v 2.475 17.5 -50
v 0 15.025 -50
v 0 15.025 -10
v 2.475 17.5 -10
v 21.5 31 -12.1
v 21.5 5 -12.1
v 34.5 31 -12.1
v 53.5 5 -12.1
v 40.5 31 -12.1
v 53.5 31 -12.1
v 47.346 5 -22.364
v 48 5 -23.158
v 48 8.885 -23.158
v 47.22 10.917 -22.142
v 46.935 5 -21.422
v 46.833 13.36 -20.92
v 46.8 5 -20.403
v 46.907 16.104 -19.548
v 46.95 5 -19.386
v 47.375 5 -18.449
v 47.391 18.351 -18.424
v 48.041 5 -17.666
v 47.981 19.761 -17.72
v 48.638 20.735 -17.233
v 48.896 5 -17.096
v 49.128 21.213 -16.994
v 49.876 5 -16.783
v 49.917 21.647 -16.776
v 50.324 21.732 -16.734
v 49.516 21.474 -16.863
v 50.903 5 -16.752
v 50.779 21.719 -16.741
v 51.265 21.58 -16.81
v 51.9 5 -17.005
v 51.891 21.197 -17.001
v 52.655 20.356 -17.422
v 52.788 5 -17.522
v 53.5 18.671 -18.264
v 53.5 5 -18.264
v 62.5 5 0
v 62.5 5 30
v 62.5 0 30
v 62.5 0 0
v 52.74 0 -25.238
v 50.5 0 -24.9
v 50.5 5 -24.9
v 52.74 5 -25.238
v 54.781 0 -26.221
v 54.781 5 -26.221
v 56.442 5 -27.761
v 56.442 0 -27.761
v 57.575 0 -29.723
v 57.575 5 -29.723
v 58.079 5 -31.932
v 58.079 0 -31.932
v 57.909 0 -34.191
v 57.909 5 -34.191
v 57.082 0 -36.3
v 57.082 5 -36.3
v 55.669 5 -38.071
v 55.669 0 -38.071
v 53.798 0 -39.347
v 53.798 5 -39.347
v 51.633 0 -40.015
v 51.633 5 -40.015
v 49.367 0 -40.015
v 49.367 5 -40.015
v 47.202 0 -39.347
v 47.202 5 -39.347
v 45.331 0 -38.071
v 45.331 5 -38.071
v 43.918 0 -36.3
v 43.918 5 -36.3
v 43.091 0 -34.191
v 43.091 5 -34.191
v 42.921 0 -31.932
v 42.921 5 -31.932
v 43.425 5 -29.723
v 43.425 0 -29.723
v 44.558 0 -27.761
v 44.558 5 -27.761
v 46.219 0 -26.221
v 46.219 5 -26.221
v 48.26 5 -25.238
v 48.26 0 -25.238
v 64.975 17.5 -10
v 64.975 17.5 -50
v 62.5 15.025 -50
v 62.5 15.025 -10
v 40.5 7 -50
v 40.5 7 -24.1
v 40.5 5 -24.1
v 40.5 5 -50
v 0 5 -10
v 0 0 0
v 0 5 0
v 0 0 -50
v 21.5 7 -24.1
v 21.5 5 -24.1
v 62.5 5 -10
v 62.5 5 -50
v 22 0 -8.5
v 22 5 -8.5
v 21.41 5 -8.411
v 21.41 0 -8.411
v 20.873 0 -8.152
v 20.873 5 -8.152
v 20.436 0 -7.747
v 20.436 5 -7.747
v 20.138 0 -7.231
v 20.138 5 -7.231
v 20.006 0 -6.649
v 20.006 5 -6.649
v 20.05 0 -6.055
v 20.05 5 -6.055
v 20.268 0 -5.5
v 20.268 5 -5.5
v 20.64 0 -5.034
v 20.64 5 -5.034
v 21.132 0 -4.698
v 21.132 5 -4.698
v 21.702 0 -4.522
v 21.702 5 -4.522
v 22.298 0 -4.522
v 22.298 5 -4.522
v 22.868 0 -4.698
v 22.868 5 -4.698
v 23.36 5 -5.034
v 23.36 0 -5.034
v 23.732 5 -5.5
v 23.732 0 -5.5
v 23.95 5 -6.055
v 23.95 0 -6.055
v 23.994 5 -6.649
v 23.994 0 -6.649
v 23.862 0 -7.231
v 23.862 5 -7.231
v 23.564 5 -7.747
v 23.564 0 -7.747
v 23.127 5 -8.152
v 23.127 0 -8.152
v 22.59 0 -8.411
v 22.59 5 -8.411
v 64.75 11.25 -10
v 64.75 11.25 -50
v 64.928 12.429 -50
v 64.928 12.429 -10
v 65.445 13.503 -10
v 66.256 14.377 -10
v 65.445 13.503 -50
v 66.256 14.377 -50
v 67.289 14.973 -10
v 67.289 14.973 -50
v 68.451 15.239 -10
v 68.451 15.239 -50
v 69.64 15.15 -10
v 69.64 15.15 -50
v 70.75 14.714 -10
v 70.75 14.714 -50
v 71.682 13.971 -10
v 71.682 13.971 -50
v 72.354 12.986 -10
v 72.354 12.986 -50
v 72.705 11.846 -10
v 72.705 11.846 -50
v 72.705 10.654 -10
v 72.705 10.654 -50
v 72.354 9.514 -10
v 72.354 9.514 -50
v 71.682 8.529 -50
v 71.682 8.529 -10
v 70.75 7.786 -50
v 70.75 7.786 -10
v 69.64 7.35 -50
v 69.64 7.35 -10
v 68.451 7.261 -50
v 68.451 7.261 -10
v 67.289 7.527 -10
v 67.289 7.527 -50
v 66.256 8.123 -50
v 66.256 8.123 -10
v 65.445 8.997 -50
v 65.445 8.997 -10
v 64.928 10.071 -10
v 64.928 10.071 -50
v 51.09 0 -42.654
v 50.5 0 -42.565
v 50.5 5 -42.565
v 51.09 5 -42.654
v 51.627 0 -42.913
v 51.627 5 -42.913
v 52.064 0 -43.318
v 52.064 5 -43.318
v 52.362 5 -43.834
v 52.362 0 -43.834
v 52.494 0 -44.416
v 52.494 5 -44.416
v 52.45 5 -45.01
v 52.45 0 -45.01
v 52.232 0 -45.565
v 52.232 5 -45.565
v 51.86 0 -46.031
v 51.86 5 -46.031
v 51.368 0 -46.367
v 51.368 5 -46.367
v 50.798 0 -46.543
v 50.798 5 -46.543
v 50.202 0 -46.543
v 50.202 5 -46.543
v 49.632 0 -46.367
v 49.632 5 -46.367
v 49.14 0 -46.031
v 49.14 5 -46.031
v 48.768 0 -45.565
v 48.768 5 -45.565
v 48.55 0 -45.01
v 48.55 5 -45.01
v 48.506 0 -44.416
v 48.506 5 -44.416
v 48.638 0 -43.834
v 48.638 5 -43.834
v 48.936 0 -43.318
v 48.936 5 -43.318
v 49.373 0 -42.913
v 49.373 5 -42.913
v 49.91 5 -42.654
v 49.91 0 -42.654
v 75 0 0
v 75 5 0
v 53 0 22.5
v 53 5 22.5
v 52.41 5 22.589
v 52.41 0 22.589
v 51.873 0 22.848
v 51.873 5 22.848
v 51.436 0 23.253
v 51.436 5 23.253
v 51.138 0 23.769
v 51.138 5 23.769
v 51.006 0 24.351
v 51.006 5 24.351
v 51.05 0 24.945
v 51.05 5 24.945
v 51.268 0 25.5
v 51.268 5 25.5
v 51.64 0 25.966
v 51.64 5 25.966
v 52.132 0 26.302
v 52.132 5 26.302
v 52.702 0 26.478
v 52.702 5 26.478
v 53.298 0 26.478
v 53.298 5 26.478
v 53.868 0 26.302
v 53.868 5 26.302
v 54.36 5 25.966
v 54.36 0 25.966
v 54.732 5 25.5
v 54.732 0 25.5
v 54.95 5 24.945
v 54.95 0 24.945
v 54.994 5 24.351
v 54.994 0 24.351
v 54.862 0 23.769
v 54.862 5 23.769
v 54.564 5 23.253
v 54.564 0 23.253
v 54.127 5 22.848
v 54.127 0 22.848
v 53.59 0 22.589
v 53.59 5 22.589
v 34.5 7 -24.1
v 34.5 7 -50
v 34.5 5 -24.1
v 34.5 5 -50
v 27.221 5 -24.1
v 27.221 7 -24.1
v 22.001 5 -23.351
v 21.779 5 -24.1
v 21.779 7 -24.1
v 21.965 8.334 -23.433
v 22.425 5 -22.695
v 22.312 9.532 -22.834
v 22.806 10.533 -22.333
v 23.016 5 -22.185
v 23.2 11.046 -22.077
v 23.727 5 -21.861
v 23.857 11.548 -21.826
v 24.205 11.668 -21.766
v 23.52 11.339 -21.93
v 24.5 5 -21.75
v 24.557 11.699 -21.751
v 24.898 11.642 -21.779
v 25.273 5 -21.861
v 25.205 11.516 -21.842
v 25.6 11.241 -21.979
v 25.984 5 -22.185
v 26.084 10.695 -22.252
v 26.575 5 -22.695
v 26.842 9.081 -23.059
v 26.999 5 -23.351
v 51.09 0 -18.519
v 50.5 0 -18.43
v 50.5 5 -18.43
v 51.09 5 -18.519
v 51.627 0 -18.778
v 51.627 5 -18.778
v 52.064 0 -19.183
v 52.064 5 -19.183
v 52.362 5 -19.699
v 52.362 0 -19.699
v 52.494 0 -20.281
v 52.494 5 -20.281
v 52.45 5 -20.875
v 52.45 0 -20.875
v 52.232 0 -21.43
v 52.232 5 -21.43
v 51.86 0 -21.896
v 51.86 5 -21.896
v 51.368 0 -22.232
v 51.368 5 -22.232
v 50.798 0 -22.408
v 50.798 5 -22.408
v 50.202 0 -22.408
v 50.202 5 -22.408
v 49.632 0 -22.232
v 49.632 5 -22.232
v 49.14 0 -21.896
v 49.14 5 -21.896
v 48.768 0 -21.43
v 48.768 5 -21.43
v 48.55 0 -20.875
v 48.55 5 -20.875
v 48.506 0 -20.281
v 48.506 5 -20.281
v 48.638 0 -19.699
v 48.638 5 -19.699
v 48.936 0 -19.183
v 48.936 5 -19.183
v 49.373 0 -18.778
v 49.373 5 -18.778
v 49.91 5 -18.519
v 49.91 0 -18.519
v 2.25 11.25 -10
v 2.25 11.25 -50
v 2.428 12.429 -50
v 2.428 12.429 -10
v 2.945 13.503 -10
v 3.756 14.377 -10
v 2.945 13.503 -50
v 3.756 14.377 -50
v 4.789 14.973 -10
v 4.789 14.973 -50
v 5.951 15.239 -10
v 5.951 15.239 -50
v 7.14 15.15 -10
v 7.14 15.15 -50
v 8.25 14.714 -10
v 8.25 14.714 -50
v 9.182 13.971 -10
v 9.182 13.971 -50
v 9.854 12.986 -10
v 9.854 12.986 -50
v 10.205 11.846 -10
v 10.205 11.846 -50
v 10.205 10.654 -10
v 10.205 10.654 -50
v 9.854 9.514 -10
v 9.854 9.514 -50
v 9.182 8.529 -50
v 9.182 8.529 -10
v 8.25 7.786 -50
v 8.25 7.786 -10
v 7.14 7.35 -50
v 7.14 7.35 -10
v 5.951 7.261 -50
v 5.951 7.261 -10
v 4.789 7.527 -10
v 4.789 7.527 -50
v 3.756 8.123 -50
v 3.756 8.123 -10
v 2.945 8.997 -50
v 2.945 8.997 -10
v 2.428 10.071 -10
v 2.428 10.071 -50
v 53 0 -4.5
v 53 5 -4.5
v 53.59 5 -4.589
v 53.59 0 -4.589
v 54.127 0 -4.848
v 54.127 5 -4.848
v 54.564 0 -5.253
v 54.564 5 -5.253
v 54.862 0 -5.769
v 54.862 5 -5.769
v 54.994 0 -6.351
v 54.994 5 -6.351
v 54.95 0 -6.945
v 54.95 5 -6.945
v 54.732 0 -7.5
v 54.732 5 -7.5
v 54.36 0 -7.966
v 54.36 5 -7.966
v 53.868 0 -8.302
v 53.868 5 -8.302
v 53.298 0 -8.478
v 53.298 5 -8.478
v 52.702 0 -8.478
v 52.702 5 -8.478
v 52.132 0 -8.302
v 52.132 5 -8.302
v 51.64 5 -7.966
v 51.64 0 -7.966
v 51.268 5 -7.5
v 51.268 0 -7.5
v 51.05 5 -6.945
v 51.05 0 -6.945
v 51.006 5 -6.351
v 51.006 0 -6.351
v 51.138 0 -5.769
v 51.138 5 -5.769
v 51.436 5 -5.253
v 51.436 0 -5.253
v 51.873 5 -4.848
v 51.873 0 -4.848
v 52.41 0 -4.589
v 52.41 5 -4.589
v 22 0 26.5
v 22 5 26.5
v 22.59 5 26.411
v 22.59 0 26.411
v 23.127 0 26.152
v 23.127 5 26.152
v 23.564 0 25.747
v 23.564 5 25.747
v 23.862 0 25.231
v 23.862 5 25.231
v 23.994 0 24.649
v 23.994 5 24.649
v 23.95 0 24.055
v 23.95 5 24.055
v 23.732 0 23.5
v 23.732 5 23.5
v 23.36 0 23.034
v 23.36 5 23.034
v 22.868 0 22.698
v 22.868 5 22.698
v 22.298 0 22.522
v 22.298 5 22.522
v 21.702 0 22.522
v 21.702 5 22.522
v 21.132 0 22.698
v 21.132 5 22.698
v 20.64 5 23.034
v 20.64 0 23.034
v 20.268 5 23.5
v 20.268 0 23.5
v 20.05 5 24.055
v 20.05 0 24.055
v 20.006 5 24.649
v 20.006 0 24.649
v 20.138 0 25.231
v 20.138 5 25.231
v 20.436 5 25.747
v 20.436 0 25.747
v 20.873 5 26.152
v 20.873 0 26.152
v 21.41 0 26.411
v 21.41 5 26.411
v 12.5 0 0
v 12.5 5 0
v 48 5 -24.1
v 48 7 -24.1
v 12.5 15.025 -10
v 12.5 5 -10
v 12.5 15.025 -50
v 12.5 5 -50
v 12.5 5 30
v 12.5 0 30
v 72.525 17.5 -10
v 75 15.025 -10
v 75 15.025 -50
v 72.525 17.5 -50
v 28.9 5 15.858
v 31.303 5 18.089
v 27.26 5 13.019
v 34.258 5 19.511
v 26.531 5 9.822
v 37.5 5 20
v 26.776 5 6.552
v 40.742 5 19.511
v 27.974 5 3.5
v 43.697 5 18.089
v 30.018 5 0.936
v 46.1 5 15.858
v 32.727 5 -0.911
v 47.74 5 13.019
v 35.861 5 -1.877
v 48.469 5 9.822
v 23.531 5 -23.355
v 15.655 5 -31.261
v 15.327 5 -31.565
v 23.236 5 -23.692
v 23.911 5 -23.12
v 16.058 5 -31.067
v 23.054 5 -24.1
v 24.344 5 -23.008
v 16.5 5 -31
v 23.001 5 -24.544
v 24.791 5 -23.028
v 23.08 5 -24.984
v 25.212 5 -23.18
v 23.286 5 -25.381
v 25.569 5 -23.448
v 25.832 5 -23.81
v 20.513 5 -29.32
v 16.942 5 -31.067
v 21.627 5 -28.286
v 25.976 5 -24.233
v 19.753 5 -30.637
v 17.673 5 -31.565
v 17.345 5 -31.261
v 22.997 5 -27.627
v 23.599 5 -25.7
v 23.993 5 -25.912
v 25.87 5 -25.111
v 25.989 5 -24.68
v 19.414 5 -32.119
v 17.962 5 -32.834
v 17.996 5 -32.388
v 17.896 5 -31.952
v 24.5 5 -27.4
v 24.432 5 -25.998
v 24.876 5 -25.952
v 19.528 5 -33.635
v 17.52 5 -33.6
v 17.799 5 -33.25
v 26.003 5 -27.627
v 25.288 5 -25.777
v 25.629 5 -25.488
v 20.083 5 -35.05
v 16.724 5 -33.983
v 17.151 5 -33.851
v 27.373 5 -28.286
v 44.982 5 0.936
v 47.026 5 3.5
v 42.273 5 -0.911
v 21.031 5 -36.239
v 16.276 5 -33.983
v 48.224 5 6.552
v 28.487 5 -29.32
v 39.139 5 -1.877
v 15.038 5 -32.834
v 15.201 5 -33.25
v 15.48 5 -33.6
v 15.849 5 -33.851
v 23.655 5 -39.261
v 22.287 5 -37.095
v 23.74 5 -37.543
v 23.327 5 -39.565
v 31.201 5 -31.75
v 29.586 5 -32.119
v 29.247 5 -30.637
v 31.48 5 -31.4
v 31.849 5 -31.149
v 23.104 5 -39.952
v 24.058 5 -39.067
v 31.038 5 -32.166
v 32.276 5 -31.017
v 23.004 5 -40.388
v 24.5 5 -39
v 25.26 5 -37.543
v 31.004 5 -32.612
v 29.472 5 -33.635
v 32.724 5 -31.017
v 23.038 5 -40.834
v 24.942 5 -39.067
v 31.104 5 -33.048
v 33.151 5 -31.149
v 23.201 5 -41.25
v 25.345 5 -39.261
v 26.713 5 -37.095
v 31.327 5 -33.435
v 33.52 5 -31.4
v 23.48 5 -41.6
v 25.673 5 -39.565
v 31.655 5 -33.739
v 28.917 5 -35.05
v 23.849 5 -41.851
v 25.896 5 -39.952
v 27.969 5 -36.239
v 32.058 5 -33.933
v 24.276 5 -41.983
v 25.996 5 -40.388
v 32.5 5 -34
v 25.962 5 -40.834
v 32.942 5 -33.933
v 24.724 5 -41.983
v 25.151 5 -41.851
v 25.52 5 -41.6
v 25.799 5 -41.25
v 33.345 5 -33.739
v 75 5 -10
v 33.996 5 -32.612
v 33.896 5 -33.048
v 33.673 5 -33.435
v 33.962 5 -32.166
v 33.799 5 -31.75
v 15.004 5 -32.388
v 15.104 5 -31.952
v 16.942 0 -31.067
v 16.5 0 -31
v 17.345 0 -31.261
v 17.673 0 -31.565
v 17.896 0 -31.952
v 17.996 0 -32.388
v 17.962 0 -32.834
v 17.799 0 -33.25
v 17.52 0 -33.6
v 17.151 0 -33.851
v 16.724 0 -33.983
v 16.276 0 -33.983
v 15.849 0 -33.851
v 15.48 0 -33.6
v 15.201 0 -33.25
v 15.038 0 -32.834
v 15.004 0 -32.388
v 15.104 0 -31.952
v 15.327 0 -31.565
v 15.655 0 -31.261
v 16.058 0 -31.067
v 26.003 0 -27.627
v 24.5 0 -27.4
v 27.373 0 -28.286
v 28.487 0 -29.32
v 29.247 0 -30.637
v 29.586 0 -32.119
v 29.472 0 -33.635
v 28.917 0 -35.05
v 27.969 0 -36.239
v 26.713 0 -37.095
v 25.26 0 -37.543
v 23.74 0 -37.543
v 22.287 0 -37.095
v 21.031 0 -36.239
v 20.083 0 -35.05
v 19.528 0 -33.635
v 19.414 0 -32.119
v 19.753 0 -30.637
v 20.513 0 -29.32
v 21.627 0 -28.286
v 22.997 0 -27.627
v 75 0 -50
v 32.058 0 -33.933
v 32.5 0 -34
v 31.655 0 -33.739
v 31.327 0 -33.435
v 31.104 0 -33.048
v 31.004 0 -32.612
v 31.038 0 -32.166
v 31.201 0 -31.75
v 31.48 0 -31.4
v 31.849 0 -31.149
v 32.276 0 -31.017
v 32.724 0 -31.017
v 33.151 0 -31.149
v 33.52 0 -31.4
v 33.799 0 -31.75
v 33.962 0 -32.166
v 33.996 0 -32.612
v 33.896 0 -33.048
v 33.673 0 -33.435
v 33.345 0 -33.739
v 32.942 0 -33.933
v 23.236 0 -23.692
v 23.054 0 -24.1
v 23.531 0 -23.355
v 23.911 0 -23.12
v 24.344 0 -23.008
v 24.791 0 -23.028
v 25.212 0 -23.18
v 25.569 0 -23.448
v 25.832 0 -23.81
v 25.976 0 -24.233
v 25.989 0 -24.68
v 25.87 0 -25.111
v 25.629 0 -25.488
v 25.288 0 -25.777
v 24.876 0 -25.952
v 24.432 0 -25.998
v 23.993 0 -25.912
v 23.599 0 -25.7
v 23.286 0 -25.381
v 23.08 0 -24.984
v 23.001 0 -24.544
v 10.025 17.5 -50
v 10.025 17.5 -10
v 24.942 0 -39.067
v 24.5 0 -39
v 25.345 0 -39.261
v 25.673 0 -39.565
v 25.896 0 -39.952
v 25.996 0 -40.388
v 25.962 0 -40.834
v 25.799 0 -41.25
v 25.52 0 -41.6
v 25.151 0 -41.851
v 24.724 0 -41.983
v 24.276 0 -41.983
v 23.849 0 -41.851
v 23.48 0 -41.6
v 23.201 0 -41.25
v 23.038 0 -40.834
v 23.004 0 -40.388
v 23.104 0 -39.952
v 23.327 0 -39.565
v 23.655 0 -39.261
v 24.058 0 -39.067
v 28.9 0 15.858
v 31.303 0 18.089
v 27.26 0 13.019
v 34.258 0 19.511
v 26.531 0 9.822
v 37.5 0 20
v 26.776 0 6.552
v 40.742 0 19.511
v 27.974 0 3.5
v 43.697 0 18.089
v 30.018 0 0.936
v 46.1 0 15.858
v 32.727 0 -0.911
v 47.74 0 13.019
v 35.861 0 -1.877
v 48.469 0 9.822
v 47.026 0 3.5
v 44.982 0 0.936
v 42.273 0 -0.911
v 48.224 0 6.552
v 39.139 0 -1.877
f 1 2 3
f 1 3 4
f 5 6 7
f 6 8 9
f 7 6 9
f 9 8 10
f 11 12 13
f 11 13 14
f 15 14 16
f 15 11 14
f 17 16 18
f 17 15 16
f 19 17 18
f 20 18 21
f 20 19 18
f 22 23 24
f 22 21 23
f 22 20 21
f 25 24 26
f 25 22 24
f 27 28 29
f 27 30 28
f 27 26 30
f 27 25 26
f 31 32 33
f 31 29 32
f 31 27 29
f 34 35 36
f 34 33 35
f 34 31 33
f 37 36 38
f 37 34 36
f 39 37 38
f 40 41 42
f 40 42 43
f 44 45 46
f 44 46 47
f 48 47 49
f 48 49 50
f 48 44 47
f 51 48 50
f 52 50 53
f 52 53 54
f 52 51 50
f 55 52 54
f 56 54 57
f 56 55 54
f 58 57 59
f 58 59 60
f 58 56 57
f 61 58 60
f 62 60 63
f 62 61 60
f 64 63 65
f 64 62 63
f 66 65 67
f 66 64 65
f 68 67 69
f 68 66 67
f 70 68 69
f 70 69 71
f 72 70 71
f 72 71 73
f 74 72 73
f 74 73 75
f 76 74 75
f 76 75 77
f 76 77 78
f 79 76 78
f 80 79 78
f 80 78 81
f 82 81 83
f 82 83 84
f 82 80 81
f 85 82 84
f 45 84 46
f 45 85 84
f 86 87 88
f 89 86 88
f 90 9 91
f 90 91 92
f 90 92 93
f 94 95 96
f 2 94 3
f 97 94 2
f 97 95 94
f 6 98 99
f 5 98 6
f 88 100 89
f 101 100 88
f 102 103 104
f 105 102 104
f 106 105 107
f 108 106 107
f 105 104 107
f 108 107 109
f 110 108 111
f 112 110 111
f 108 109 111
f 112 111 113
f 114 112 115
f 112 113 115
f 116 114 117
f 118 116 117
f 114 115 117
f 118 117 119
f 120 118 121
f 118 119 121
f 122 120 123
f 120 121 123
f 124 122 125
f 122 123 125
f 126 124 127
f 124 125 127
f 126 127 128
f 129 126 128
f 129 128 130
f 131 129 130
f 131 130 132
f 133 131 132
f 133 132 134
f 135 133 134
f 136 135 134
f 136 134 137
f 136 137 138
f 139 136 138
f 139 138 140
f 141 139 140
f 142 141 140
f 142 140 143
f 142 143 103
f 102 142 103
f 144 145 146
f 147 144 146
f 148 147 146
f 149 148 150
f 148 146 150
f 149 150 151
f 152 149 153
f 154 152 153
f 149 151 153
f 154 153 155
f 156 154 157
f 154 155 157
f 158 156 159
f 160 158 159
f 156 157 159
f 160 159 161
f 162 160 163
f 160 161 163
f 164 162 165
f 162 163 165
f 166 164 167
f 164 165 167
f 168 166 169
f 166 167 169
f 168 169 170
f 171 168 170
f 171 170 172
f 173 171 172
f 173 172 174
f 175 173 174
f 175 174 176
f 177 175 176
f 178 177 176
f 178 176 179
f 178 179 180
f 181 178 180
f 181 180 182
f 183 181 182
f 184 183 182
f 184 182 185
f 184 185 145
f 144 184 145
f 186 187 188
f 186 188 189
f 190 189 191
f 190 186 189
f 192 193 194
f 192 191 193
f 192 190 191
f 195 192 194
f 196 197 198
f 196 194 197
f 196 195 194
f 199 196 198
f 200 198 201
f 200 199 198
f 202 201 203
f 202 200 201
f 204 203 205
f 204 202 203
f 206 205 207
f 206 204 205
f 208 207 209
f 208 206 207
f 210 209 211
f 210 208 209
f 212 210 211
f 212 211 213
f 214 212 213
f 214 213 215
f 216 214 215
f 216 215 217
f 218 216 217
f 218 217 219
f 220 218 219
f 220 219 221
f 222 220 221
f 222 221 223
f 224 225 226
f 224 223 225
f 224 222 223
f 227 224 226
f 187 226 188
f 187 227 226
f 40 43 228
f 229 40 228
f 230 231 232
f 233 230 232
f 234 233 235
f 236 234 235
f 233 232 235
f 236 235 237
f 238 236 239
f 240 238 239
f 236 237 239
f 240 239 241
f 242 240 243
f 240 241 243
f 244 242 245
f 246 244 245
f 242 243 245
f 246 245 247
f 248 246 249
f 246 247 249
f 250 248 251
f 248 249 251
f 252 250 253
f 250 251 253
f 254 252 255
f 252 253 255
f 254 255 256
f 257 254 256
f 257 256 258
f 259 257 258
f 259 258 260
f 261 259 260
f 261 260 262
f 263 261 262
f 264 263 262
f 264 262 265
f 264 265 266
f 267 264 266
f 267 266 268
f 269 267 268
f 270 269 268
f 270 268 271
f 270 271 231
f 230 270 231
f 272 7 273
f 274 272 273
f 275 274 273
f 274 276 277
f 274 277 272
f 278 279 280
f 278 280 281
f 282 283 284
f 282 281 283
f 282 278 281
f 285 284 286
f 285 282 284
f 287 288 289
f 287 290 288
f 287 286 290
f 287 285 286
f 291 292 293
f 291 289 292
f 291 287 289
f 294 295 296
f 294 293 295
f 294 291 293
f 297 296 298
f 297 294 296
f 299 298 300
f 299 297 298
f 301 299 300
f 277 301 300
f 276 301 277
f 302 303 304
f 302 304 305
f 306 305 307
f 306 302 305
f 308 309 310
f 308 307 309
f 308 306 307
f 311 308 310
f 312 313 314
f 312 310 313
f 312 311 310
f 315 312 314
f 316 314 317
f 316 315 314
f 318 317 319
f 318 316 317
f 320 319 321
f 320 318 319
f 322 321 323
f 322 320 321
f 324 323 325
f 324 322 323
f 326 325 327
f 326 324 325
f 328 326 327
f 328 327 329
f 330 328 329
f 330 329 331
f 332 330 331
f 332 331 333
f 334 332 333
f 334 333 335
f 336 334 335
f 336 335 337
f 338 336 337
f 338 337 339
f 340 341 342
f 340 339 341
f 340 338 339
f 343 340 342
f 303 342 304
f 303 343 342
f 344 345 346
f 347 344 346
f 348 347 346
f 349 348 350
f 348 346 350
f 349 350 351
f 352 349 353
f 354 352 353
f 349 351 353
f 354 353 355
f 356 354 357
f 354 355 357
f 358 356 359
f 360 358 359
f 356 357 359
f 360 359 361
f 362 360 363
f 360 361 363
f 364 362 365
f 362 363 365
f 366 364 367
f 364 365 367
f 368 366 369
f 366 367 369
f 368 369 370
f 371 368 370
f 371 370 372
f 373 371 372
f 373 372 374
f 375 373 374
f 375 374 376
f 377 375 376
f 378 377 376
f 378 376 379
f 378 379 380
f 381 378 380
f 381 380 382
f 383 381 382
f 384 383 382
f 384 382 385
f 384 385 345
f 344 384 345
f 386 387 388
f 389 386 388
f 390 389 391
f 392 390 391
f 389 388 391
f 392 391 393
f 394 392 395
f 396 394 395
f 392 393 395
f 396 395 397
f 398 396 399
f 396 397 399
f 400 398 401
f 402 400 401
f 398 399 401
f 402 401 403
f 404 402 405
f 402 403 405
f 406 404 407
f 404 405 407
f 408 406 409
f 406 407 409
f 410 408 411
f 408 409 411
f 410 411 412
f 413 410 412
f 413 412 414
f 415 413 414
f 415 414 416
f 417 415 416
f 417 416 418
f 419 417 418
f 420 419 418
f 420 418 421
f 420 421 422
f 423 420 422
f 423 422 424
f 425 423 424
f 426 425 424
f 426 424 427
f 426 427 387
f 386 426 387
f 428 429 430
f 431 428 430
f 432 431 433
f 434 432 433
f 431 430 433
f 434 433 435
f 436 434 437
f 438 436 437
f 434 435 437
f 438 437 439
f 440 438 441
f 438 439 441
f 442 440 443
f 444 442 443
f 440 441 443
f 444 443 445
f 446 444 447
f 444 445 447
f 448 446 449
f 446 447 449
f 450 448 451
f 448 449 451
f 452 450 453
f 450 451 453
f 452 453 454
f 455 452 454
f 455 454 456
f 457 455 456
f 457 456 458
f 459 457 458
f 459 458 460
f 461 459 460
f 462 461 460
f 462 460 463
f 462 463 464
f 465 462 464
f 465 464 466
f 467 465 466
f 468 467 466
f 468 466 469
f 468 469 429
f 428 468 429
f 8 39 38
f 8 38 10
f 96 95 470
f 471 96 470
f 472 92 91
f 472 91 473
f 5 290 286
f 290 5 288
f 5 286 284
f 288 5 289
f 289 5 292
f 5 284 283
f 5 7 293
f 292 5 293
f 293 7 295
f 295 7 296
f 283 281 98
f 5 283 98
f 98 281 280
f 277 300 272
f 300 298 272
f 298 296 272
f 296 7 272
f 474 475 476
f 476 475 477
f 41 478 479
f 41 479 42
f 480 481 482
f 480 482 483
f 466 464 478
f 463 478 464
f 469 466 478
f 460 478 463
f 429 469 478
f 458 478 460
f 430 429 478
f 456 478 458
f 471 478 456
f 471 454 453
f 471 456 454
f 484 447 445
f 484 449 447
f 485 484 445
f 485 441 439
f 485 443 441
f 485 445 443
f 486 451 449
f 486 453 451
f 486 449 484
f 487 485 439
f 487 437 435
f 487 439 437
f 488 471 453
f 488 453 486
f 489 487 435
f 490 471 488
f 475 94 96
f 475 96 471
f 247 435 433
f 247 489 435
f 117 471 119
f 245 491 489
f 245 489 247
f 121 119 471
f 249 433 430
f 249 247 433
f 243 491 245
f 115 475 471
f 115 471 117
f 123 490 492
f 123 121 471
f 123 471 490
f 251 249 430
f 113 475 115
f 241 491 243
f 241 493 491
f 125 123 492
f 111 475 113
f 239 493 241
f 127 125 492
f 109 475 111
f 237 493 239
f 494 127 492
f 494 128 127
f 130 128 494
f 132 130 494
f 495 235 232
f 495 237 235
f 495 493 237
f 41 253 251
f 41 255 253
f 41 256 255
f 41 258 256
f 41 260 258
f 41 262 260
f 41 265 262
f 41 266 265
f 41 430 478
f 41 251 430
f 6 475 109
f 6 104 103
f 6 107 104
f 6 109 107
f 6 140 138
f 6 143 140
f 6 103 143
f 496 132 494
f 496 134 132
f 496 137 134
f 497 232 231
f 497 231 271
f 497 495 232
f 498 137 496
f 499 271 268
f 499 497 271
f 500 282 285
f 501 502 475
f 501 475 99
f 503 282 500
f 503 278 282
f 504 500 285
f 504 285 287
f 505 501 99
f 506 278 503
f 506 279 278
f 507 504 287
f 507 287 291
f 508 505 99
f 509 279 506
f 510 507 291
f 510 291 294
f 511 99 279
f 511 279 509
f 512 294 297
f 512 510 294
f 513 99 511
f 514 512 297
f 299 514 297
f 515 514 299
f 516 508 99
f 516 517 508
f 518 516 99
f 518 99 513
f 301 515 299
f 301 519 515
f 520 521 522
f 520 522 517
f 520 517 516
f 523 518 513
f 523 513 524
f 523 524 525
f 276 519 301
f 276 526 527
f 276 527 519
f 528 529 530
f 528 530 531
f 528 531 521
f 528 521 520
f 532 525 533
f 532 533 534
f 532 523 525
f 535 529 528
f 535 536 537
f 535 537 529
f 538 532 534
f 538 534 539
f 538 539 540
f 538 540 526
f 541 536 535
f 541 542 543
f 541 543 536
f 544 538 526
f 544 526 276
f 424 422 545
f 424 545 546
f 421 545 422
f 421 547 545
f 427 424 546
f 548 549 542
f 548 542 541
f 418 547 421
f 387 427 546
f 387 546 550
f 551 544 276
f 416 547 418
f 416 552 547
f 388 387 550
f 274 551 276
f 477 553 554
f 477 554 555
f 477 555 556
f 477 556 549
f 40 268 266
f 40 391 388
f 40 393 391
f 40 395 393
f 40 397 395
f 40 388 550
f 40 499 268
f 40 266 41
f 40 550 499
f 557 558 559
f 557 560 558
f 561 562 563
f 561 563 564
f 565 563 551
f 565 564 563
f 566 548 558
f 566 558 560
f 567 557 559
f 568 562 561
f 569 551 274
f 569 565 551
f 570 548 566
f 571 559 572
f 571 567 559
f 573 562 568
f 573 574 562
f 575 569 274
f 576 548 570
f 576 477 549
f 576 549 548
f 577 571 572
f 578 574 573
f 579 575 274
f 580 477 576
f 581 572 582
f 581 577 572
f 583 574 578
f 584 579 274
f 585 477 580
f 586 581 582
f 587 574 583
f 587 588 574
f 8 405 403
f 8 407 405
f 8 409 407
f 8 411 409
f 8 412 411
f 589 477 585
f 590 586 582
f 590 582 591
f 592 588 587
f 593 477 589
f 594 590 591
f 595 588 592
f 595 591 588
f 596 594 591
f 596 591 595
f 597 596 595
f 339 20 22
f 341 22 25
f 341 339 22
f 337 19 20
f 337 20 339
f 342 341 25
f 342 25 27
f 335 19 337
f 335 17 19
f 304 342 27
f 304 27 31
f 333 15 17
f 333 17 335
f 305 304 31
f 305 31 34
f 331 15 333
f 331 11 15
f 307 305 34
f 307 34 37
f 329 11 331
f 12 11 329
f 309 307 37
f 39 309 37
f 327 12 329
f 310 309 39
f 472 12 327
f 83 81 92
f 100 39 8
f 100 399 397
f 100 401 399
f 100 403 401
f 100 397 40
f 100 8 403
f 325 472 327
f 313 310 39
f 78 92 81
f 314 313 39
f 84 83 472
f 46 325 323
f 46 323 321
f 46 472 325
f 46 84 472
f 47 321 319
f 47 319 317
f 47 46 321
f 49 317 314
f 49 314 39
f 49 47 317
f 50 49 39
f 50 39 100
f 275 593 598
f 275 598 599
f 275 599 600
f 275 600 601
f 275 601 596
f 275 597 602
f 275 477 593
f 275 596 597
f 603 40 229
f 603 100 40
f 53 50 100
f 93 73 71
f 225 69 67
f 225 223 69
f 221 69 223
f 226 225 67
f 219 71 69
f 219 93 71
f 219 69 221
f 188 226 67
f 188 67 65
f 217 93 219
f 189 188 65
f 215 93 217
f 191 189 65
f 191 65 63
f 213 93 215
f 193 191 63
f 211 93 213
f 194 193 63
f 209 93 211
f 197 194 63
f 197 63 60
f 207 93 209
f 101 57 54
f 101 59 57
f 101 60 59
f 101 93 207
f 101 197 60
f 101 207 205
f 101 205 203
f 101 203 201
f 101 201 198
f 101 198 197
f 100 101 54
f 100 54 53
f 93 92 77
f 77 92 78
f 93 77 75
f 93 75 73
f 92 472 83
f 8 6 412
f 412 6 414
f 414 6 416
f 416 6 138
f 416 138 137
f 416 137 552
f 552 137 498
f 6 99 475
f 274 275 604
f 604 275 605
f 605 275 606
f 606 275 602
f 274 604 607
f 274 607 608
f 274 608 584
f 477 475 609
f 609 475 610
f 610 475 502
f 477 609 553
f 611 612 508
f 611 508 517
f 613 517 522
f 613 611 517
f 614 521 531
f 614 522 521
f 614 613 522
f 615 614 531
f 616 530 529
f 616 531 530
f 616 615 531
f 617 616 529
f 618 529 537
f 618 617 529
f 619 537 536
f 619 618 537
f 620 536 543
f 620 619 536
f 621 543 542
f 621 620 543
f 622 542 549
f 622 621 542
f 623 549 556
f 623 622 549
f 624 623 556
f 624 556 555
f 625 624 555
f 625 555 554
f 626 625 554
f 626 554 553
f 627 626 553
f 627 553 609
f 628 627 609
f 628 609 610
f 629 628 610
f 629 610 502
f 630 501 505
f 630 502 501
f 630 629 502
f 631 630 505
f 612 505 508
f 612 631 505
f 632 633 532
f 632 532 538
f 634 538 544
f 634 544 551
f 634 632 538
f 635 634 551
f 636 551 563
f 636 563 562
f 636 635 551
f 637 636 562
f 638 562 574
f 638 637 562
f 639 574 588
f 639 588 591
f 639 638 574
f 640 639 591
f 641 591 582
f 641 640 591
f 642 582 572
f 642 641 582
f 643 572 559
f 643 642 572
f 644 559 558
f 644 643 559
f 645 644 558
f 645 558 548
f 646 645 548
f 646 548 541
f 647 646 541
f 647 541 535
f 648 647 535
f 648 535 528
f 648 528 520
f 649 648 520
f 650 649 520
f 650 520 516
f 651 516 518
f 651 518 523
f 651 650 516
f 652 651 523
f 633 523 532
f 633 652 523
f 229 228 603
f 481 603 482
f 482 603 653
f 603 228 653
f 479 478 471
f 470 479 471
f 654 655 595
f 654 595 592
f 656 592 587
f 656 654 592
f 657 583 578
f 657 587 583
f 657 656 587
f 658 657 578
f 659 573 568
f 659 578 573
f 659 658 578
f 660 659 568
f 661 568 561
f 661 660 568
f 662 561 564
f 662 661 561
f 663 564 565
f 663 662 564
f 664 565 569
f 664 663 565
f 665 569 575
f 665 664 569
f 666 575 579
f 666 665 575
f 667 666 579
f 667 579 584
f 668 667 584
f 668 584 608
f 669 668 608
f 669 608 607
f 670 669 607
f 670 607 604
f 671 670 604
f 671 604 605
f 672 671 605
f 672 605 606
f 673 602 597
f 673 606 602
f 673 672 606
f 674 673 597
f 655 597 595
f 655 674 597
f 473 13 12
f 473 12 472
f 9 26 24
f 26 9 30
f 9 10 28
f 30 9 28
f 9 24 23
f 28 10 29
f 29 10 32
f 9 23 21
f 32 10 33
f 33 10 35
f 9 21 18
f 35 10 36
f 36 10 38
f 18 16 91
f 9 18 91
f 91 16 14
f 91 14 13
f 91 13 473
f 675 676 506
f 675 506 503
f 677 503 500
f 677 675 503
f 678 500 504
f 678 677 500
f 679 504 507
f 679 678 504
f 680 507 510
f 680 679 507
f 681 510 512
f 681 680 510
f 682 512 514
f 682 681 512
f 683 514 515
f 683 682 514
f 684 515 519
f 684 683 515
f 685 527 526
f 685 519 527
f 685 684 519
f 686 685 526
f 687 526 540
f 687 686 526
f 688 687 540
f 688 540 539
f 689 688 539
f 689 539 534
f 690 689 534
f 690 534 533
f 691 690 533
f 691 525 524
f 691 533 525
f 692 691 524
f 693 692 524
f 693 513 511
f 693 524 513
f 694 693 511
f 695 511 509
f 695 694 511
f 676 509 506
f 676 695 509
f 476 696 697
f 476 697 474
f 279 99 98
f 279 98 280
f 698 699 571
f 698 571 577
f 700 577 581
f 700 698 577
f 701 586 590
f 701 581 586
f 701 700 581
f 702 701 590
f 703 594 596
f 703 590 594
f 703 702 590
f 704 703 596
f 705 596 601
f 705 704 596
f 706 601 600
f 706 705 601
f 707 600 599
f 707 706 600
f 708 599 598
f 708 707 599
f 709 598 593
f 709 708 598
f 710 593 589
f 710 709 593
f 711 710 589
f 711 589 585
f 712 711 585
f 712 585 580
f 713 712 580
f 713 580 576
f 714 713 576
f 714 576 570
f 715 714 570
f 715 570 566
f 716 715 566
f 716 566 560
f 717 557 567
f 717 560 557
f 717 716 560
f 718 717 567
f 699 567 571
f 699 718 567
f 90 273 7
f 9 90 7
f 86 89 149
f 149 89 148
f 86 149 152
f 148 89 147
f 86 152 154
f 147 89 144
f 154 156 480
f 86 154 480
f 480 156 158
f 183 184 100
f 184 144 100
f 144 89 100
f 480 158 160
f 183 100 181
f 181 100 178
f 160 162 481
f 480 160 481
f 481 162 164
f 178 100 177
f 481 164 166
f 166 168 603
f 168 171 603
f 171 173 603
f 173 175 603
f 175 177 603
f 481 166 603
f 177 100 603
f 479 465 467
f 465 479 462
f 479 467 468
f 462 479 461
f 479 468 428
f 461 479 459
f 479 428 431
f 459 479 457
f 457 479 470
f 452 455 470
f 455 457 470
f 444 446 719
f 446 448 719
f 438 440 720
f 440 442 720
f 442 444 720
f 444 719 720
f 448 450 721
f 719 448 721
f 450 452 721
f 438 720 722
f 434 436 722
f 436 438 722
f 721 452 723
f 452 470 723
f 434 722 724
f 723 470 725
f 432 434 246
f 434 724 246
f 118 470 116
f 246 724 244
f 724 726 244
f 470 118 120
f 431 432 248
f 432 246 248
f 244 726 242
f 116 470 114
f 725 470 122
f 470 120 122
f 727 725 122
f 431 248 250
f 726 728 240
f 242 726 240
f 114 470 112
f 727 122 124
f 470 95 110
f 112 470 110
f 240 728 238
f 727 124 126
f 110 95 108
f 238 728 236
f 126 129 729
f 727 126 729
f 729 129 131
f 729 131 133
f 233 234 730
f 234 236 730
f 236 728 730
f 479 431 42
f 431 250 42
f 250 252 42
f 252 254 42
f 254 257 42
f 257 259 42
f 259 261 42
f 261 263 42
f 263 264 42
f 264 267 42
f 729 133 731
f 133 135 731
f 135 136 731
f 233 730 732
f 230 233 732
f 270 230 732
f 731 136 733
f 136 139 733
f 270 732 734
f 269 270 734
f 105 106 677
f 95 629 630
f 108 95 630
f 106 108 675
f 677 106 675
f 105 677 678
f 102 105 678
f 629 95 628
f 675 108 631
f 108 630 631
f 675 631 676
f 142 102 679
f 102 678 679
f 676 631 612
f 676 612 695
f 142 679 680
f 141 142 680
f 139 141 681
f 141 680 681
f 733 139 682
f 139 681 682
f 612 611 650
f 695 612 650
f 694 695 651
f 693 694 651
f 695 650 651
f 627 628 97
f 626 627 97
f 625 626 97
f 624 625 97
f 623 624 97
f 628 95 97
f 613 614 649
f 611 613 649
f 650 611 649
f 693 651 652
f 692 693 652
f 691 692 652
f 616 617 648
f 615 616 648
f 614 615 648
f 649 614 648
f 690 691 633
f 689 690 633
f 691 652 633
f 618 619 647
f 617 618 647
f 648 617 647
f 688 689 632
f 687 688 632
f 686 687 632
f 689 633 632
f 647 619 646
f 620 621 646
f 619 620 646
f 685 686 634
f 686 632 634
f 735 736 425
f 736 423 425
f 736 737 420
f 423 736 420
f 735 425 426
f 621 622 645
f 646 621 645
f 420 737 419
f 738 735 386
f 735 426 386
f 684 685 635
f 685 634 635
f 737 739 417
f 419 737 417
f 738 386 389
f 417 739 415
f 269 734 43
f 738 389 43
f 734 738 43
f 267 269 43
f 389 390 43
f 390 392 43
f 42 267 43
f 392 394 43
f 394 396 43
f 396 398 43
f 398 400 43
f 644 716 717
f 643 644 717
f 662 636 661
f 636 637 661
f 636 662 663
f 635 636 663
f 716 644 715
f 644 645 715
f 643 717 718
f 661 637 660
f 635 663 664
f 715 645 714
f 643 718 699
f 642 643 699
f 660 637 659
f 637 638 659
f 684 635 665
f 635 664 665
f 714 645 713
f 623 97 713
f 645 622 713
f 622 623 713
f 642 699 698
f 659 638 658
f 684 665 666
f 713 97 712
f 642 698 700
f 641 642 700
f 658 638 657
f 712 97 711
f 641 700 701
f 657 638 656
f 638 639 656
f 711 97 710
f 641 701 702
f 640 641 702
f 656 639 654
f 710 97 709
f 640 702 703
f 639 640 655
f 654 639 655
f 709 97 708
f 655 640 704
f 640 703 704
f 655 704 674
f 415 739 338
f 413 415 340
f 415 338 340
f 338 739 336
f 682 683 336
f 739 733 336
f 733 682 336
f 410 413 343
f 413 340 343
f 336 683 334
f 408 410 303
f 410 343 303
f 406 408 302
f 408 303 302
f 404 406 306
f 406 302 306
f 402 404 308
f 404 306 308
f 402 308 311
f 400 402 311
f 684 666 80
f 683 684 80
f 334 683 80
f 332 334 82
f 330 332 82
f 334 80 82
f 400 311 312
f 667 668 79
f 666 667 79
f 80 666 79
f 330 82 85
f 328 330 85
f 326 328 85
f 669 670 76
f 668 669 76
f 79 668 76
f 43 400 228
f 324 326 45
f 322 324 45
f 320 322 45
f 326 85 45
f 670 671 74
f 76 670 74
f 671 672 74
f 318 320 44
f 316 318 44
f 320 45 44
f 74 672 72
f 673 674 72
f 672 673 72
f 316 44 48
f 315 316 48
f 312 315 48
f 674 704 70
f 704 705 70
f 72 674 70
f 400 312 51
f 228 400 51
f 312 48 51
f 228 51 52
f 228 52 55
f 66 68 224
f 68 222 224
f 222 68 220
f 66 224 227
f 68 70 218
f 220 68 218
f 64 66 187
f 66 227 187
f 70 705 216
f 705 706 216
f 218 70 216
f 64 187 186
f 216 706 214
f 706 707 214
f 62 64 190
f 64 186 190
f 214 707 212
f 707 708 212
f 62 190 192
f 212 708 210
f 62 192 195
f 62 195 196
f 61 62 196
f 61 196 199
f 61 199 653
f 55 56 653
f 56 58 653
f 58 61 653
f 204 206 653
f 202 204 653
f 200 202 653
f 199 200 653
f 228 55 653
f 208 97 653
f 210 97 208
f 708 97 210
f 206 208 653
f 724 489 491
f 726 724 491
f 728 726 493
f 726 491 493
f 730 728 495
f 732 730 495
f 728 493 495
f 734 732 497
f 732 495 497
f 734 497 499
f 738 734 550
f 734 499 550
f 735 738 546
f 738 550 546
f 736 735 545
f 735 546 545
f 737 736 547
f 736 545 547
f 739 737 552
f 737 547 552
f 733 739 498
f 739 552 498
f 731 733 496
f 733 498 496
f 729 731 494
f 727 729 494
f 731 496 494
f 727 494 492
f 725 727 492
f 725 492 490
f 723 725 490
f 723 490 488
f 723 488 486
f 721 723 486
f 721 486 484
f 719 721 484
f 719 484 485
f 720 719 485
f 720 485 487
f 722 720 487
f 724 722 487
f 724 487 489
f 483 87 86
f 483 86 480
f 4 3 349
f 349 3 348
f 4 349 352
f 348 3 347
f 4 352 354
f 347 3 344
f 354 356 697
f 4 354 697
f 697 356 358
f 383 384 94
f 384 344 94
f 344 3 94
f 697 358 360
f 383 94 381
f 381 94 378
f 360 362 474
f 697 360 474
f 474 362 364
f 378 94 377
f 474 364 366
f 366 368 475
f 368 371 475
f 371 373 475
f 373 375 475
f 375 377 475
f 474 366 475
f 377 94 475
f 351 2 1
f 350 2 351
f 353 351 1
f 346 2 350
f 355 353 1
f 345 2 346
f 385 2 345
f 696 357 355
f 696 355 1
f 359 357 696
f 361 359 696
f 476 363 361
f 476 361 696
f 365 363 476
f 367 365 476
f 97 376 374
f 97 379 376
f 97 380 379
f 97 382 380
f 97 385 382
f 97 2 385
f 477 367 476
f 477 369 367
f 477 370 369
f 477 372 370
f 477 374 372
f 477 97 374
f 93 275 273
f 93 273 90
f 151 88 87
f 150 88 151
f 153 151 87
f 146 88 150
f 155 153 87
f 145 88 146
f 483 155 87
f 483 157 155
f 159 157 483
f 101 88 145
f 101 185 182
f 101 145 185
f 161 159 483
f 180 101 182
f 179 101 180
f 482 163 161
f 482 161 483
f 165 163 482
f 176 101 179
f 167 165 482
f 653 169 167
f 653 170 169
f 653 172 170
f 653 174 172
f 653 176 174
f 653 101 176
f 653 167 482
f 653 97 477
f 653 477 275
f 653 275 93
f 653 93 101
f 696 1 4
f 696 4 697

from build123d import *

# Parameters (mm, degrees)
SKETCH1_W               = 75
SKETCH1_H               = 50
SKETCH1_R               = 5.1
SKETCH1_R_2             = 7.6
BOSS_EXTRUDE1_DEPTH     = 5
SKETCH2_W               = 12.5
SKETCH2_H               = 40
BOSS_EXTRUDE2_DEPTH     = 12.5
SKETCH3_R               = 4
CUT_EXTRUDE1_DEPTH      = 92.821838361
SKETCH4_W               = 50
SKETCH4_H               = 30
BOSS_EXTRUDE3_DEPTH     = 5
SKETCH5_R               = 2
SKETCH5_R_2             = 11
CUT_EXTRUDE2_DEPTH      = 92.001373616
SKETCH6_W               = 32
SKETCH6_H               = 12
BOSS_EXTRUDE4_DEPTH     = 2
BOSS_EXTRUDE6_DEPTH     = 32
SKETCH9_W               = 6
SKETCH9_H               = 25.9
BOSS_EXTRUDE7_DEPTH     = 2
BOSS_EXTRUDE8_DEPTH     = 6
CUT_EXTRUDE3_DEPTH      = 97.571217244
CUT_EXTRUDE3_DEPTH_BACK = 97.571217244
SKETCH11_R              = 2
SKETCH11_R_2            = 1.5
SKETCH13_R              = 3.7
SKETCH13_R_2            = 2.75
SKETCH13_W              = 5.5
SKETCH13_H              = 1.674207078
CUT_EXTRUDE4_DEPTH      = 94.813645063


with BuildPart() as part:
    # Sketch1 → Boss-Extrude1 (new body)
    with BuildSketch(Plane(origin=(0, 0, 0), x_dir=(1, 0, 0), z_dir=(0, 1, 0))):
        with Locations((37.5, 25)):
            Rectangle(SKETCH1_W, SKETCH1_H)
        with Locations(Location((24.5, 32.5, 0), (0, 0, 270))):
            Circle(SKETCH1_R, mode=Mode.SUBTRACT)
        with Locations(Location((50.5, 32.5, 0), (0, 0, 270))):
            Circle(SKETCH1_R_2, mode=Mode.SUBTRACT)
    extrude(amount=BOSS_EXTRUDE1_DEPTH)

    # Sketch2 → Boss-Extrude2 (add)
    with BuildSketch(Plane(origin=(0, 5, 0), x_dir=(1, 0, 0), z_dir=(0, 1, 0))):
        with Locations((6.25, 30)):
            Rectangle(SKETCH2_W, SKETCH2_H)
        with Locations((68.75, 30)):
            Rectangle(SKETCH2_W, SKETCH2_H)
    extrude(amount=BOSS_EXTRUDE2_DEPTH)

    # Sketch3 → Cut-Extrude1 (cut, through all)
    with BuildSketch(Plane(origin=(0, 0, -50), x_dir=(-1, 0, 0), z_dir=(0, 0, -1))):
        with Locations((-68.75, 11.25)):
            Circle(SKETCH3_R)
        with Locations((-6.25, 11.25)):
            Circle(SKETCH3_R)
        Polygon((-72.525126266, 17.5), (-75, 17.5), (-75, 15.025126266), align=None)
        Polygon((-62.5, 17.5), (-64.974873734, 17.5), (-62.5, 15.025126266), align=None)
        Polygon((-12.5, 15.025126266), (-12.5, 17.5), (-10.025126266, 17.5), align=None)
        Polygon((0, 15.025126266), (-2.474873734, 17.5), (0, 17.5), align=None)
    extrude(amount=-CUT_EXTRUDE1_DEPTH, mode=Mode.SUBTRACT)

    # Sketch4 → Boss-Extrude3 (add)
    with BuildSketch(Plane(origin=(0, 5, 0), x_dir=(1, 0, 0), z_dir=(0, 1, 0))):
        with Locations((37.5, -15)):
            Rectangle(SKETCH4_W, SKETCH4_H)
    extrude(amount=-BOSS_EXTRUDE3_DEPTH)

    # Sketch5 → Cut-Extrude2 (cut, through all)
    with BuildSketch(Plane(origin=(0, 5, 0), x_dir=(1, 0, 0), z_dir=(0, 1, 0))):
        with Locations(Location((22, -24.5, 0), (0, 0, 270))):
            Circle(SKETCH5_R)
        with Locations(Location((22, 6.5, 0), (0, 0, 90))):
            Circle(SKETCH5_R)
        with Locations(Location((53, 6.5, 0), (0, 0, 270))):
            Circle(SKETCH5_R)
        with Locations(Location((53, -24.5, 0), (0, 0, 90))):
            Circle(SKETCH5_R)
        with Locations(Location((37.5, -9, 0), (0, 0, 270))):
            Circle(SKETCH5_R_2)
    extrude(amount=-CUT_EXTRUDE2_DEPTH, mode=Mode.SUBTRACT)

    # Sketch6 → Boss-Extrude4 (add)
    with BuildSketch(Plane(origin=(0, 5, 0), x_dir=(1, 0, 0), z_dir=(0, 1, 0))):
        with Locations((37.5, 18.1)):
            Rectangle(SKETCH6_W, SKETCH6_H)
    extrude(amount=BOSS_EXTRUDE4_DEPTH)

    # Sketch8 → Boss-Extrude6 (add)
    with BuildSketch(Plane(origin=(53.5, 0, 0), x_dir=(0, 0, -1), z_dir=(1, 0, 0))):
        Polygon((24.1, 7), (12.1, 7), (12.1, 31), align=None)
    extrude(amount=-BOSS_EXTRUDE6_DEPTH)

    # Sketch9 → Boss-Extrude7 (add)
    with BuildSketch(Plane(origin=(0, 5, 0), x_dir=(1, 0, 0), z_dir=(0, 1, 0))):
        with Locations((37.5, 37.05)):
            Rectangle(SKETCH9_W, SKETCH9_H)
    extrude(amount=BOSS_EXTRUDE7_DEPTH)

    # Sketch10 → Boss-Extrude8 (add)
    with BuildSketch(Plane.ZY.offset(-34.5)):
        Polygon((-50, 7), (-12.1, 31), (-24.1, 7), align=None)
    extrude(amount=-BOSS_EXTRUDE8_DEPTH)

    # Sketch11 → Cut-Extrude3 (cut, two sides: drawn at the far end of the back side and taken through both)
    with BuildSketch(Plane(origin=(0, 5, 5), x_dir=(1, 0, 0), z_dir=(0, 1, 0)).offset(-CUT_EXTRUDE3_DEPTH_BACK)):
        with Locations(Location((50.5, 25.43, 0), (0, 0, 270))):
            Circle(SKETCH11_R)
        with Locations(Location((50.5, 49.565, 0), (0, 0, 270))):
            Circle(SKETCH11_R)
        with Locations(Location((24.5, 45.5, 0), (0, 0, 270))):
            Circle(SKETCH11_R_2)
        with Locations(Location((16.5, 37.5, 0), (0, 0, 270))):
            Circle(SKETCH11_R_2)
        with Locations(Location((32.5, 37.5, 0), (0, 0, 90))):
            Circle(SKETCH11_R_2)
        with Locations(Location((24.5, 29.5, 0), (0, 0, 195.466009953))):
            Circle(SKETCH11_R_2)
    extrude(amount=CUT_EXTRUDE3_DEPTH + CUT_EXTRUDE3_DEPTH_BACK, mode=Mode.SUBTRACT)

    # Sketch13 → Cut-Extrude4 (cut, through all)
    with BuildSketch(Plane(origin=(0, 5, 0), x_dir=(1, 0, 0), z_dir=(0, 1, 0))):
        with Locations((50.5, 20.43)):
            Circle(SKETCH13_R)
        with Locations((24.5, 24.5)):
            Circle(SKETCH13_R_2)
        with Locations((50.75, 23.262896461)):
            Rectangle(SKETCH13_W, SKETCH13_H)
    extrude(amount=CUT_EXTRUDE4_DEPTH, mode=Mode.SUBTRACT)


solid = part.part
